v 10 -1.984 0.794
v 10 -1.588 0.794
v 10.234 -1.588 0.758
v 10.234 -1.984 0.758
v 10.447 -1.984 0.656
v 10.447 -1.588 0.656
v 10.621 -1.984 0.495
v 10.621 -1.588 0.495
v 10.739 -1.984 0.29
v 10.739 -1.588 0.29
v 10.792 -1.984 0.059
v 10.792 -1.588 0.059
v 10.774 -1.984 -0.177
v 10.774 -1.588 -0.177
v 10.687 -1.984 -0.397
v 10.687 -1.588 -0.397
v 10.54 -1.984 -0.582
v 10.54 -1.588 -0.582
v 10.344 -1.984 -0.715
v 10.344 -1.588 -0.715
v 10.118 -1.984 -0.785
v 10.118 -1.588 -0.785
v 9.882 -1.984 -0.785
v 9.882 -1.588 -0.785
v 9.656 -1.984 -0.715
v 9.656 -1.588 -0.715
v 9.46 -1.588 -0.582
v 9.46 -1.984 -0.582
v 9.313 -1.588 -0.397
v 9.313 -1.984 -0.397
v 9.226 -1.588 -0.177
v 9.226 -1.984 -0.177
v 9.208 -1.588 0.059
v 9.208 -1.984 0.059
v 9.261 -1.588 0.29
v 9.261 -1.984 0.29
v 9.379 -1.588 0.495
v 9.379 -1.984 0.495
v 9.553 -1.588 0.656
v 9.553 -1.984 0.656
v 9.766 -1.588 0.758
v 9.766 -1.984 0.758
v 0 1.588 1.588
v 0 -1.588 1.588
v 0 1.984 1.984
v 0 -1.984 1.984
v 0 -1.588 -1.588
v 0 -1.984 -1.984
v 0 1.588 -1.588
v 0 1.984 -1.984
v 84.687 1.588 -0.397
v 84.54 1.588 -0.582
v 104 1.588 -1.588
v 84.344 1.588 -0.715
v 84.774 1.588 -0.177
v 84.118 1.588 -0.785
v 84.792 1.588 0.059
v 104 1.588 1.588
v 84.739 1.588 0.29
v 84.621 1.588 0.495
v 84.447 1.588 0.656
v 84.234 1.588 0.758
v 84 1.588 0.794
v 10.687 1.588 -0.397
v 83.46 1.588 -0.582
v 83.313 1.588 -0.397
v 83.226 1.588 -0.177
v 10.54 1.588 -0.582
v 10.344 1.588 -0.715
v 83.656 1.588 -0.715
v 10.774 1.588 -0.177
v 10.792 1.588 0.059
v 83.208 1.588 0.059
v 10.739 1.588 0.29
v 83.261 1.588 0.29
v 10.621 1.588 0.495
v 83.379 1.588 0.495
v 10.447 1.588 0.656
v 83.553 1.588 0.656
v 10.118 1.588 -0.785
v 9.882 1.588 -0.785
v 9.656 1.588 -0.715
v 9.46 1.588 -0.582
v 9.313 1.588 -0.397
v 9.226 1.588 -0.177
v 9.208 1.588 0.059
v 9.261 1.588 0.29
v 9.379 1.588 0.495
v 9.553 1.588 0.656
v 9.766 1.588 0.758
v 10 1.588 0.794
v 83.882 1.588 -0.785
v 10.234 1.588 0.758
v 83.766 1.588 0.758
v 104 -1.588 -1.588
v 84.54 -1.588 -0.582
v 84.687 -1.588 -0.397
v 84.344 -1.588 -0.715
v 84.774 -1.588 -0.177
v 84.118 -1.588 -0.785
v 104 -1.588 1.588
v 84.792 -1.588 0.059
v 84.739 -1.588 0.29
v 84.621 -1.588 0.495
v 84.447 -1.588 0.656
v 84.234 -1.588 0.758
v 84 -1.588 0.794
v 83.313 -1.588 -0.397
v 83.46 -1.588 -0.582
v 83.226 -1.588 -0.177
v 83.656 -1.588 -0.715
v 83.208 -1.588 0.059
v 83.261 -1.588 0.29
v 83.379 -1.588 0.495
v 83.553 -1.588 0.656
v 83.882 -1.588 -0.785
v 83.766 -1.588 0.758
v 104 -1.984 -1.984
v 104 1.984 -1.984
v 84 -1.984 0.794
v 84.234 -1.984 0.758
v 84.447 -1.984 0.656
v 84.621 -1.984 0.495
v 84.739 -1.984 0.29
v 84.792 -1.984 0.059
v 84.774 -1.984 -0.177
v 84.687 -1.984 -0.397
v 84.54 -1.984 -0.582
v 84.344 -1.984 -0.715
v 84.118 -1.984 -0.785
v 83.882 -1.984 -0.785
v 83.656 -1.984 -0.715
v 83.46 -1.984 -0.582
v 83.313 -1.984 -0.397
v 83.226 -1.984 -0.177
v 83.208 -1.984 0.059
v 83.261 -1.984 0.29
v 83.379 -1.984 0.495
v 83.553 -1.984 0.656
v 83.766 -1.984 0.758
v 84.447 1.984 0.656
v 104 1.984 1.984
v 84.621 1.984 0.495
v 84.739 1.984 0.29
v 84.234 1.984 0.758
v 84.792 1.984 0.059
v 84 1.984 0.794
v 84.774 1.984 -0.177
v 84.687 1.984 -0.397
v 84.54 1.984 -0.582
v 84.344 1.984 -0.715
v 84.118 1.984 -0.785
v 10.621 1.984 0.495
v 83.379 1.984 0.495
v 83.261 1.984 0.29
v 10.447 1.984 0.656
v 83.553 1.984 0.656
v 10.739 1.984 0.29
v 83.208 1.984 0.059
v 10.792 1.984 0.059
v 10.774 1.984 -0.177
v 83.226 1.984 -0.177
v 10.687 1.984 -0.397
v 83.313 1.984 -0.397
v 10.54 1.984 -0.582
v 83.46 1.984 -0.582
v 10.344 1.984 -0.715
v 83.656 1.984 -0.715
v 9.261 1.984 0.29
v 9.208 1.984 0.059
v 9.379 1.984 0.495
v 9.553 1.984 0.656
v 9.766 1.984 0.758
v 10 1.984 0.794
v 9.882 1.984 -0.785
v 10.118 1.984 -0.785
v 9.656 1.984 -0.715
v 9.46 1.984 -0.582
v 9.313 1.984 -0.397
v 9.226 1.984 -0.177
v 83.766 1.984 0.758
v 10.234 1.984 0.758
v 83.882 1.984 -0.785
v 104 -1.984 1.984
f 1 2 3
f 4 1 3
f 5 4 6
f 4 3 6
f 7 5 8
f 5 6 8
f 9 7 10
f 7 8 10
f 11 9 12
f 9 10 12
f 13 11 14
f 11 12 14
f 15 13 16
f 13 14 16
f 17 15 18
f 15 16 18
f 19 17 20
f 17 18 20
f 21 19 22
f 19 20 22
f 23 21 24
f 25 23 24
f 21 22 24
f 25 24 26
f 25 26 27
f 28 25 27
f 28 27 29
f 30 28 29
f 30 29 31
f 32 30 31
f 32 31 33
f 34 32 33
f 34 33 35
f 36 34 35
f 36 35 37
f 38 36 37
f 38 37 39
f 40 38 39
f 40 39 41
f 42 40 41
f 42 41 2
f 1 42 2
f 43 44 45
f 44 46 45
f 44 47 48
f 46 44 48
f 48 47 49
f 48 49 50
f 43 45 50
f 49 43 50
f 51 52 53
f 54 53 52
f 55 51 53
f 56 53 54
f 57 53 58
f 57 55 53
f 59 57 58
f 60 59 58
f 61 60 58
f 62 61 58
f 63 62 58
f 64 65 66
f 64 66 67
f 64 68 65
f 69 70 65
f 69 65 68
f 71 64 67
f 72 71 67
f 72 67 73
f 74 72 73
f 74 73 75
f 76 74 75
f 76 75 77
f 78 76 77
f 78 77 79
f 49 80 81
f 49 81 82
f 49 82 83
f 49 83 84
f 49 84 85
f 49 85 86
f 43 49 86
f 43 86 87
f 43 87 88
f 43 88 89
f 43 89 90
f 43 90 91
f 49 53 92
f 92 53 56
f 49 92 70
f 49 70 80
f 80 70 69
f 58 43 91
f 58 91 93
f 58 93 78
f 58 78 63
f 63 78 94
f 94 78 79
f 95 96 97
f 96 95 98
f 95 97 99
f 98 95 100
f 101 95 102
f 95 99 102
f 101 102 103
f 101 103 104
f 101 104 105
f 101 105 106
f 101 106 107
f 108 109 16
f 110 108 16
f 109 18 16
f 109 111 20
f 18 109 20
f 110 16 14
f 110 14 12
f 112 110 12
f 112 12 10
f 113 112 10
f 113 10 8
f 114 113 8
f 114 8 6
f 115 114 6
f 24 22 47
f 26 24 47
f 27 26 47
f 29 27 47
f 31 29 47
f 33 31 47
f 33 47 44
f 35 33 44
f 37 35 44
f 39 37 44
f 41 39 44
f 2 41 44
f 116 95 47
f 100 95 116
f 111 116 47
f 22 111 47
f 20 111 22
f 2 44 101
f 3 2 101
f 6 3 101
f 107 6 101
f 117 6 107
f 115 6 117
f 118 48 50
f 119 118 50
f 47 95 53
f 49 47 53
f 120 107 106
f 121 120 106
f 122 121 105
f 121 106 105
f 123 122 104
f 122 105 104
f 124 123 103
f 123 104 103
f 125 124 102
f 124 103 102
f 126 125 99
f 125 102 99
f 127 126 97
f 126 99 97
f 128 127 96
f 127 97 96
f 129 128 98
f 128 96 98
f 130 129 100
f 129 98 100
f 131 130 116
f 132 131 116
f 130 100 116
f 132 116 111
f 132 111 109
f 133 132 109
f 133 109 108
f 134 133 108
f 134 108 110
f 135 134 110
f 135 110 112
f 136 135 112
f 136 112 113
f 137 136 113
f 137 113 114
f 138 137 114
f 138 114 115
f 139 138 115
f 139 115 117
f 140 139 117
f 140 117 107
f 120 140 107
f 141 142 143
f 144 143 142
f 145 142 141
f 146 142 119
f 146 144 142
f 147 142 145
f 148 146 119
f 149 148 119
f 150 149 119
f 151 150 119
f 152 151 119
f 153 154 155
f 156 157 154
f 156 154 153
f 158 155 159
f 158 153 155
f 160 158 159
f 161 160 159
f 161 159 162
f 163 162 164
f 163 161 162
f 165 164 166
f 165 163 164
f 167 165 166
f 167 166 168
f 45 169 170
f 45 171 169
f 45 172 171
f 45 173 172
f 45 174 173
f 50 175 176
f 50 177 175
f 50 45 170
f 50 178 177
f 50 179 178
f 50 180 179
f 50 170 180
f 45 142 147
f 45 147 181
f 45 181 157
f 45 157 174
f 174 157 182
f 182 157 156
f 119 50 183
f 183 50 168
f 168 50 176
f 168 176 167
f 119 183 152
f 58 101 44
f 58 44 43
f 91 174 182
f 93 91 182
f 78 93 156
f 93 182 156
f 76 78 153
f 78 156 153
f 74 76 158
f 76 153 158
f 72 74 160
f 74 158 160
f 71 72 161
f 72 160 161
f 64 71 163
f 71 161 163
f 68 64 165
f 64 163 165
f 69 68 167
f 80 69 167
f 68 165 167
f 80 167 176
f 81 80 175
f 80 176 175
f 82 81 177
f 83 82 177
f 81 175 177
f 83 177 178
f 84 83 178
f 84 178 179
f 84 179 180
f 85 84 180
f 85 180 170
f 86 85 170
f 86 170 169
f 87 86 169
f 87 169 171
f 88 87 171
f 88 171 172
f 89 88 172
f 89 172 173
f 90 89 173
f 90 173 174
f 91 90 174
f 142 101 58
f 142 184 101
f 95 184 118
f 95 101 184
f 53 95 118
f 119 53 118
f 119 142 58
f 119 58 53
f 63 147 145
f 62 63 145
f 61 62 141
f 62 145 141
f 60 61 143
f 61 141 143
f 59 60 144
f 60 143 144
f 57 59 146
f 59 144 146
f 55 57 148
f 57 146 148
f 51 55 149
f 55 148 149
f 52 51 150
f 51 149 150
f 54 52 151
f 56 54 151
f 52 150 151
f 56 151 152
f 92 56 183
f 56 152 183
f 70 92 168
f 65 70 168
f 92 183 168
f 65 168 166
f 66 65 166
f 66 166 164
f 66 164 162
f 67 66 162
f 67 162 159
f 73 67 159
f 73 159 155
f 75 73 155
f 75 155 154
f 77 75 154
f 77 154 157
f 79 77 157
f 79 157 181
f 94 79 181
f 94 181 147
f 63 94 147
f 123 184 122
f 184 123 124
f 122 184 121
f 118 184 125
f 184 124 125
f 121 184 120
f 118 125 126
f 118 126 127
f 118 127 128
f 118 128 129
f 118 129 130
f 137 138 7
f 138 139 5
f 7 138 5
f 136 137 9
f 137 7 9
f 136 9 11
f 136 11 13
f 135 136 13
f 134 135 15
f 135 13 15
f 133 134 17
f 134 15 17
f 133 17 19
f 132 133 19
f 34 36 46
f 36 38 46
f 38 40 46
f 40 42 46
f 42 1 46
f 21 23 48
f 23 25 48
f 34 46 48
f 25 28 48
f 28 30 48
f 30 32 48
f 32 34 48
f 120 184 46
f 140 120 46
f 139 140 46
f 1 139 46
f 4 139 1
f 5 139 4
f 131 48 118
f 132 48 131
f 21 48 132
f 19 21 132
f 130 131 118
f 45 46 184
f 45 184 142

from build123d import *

# Parameters (mm, degrees)
SKETCH1_W           = 3.96875
SKETCH1_H           = 3.96875
BOSS_EXTRUDE1_DEPTH = 104
SKETCH2_W           = 3.175
SKETCH2_H           = 3.175
CUT_EXTRUDE1_DEPTH  = 105.037856035
SKETCH3_R           = 0.79375
CUT_EXTRUDE2_DEPTH  = 105.094614273
SKETCH4_R           = 0.79375
CUT_EXTRUDE3_DEPTH  = 105.094614273


with BuildPart() as part:
    # Sketch1 → Boss-Extrude1 (new body)
    with BuildSketch(Plane(origin=(0, 0, 0), x_dir=(0, 0, -1), z_dir=(1, 0, 0))):
        Rectangle(SKETCH1_W, SKETCH1_H)
    extrude(amount=BOSS_EXTRUDE1_DEPTH)

    # Sketch2 → Cut-Extrude1 (cut, through all)
    with BuildSketch(Plane.ZY):
        Rectangle(SKETCH2_W, SKETCH2_H)
    extrude(amount=-CUT_EXTRUDE1_DEPTH, mode=Mode.SUBTRACT)

    # Sketch3 → Cut-Extrude2 (cut, through all)
    with BuildSketch(Plane(origin=(0, 1.984375, 0), x_dir=(1, 0, 0), z_dir=(0, 1, 0))):
        with Locations(Location((10, 0, 0), (0, 0, 270))):
            Circle(SKETCH3_R)
    extrude(amount=-CUT_EXTRUDE2_DEPTH, mode=Mode.SUBTRACT)

    # Sketch4 → Cut-Extrude3 (cut, through all)
    with BuildSketch(Plane(origin=(0, 1.984375, 0), x_dir=(1, 0, 0), z_dir=(0, 1, 0))):
        with Locations(Location((84, 0, 0), (0, 0, 270))):
            Circle(SKETCH4_R)
    extrude(amount=-CUT_EXTRUDE3_DEPTH, mode=Mode.SUBTRACT)


solid = part.part
